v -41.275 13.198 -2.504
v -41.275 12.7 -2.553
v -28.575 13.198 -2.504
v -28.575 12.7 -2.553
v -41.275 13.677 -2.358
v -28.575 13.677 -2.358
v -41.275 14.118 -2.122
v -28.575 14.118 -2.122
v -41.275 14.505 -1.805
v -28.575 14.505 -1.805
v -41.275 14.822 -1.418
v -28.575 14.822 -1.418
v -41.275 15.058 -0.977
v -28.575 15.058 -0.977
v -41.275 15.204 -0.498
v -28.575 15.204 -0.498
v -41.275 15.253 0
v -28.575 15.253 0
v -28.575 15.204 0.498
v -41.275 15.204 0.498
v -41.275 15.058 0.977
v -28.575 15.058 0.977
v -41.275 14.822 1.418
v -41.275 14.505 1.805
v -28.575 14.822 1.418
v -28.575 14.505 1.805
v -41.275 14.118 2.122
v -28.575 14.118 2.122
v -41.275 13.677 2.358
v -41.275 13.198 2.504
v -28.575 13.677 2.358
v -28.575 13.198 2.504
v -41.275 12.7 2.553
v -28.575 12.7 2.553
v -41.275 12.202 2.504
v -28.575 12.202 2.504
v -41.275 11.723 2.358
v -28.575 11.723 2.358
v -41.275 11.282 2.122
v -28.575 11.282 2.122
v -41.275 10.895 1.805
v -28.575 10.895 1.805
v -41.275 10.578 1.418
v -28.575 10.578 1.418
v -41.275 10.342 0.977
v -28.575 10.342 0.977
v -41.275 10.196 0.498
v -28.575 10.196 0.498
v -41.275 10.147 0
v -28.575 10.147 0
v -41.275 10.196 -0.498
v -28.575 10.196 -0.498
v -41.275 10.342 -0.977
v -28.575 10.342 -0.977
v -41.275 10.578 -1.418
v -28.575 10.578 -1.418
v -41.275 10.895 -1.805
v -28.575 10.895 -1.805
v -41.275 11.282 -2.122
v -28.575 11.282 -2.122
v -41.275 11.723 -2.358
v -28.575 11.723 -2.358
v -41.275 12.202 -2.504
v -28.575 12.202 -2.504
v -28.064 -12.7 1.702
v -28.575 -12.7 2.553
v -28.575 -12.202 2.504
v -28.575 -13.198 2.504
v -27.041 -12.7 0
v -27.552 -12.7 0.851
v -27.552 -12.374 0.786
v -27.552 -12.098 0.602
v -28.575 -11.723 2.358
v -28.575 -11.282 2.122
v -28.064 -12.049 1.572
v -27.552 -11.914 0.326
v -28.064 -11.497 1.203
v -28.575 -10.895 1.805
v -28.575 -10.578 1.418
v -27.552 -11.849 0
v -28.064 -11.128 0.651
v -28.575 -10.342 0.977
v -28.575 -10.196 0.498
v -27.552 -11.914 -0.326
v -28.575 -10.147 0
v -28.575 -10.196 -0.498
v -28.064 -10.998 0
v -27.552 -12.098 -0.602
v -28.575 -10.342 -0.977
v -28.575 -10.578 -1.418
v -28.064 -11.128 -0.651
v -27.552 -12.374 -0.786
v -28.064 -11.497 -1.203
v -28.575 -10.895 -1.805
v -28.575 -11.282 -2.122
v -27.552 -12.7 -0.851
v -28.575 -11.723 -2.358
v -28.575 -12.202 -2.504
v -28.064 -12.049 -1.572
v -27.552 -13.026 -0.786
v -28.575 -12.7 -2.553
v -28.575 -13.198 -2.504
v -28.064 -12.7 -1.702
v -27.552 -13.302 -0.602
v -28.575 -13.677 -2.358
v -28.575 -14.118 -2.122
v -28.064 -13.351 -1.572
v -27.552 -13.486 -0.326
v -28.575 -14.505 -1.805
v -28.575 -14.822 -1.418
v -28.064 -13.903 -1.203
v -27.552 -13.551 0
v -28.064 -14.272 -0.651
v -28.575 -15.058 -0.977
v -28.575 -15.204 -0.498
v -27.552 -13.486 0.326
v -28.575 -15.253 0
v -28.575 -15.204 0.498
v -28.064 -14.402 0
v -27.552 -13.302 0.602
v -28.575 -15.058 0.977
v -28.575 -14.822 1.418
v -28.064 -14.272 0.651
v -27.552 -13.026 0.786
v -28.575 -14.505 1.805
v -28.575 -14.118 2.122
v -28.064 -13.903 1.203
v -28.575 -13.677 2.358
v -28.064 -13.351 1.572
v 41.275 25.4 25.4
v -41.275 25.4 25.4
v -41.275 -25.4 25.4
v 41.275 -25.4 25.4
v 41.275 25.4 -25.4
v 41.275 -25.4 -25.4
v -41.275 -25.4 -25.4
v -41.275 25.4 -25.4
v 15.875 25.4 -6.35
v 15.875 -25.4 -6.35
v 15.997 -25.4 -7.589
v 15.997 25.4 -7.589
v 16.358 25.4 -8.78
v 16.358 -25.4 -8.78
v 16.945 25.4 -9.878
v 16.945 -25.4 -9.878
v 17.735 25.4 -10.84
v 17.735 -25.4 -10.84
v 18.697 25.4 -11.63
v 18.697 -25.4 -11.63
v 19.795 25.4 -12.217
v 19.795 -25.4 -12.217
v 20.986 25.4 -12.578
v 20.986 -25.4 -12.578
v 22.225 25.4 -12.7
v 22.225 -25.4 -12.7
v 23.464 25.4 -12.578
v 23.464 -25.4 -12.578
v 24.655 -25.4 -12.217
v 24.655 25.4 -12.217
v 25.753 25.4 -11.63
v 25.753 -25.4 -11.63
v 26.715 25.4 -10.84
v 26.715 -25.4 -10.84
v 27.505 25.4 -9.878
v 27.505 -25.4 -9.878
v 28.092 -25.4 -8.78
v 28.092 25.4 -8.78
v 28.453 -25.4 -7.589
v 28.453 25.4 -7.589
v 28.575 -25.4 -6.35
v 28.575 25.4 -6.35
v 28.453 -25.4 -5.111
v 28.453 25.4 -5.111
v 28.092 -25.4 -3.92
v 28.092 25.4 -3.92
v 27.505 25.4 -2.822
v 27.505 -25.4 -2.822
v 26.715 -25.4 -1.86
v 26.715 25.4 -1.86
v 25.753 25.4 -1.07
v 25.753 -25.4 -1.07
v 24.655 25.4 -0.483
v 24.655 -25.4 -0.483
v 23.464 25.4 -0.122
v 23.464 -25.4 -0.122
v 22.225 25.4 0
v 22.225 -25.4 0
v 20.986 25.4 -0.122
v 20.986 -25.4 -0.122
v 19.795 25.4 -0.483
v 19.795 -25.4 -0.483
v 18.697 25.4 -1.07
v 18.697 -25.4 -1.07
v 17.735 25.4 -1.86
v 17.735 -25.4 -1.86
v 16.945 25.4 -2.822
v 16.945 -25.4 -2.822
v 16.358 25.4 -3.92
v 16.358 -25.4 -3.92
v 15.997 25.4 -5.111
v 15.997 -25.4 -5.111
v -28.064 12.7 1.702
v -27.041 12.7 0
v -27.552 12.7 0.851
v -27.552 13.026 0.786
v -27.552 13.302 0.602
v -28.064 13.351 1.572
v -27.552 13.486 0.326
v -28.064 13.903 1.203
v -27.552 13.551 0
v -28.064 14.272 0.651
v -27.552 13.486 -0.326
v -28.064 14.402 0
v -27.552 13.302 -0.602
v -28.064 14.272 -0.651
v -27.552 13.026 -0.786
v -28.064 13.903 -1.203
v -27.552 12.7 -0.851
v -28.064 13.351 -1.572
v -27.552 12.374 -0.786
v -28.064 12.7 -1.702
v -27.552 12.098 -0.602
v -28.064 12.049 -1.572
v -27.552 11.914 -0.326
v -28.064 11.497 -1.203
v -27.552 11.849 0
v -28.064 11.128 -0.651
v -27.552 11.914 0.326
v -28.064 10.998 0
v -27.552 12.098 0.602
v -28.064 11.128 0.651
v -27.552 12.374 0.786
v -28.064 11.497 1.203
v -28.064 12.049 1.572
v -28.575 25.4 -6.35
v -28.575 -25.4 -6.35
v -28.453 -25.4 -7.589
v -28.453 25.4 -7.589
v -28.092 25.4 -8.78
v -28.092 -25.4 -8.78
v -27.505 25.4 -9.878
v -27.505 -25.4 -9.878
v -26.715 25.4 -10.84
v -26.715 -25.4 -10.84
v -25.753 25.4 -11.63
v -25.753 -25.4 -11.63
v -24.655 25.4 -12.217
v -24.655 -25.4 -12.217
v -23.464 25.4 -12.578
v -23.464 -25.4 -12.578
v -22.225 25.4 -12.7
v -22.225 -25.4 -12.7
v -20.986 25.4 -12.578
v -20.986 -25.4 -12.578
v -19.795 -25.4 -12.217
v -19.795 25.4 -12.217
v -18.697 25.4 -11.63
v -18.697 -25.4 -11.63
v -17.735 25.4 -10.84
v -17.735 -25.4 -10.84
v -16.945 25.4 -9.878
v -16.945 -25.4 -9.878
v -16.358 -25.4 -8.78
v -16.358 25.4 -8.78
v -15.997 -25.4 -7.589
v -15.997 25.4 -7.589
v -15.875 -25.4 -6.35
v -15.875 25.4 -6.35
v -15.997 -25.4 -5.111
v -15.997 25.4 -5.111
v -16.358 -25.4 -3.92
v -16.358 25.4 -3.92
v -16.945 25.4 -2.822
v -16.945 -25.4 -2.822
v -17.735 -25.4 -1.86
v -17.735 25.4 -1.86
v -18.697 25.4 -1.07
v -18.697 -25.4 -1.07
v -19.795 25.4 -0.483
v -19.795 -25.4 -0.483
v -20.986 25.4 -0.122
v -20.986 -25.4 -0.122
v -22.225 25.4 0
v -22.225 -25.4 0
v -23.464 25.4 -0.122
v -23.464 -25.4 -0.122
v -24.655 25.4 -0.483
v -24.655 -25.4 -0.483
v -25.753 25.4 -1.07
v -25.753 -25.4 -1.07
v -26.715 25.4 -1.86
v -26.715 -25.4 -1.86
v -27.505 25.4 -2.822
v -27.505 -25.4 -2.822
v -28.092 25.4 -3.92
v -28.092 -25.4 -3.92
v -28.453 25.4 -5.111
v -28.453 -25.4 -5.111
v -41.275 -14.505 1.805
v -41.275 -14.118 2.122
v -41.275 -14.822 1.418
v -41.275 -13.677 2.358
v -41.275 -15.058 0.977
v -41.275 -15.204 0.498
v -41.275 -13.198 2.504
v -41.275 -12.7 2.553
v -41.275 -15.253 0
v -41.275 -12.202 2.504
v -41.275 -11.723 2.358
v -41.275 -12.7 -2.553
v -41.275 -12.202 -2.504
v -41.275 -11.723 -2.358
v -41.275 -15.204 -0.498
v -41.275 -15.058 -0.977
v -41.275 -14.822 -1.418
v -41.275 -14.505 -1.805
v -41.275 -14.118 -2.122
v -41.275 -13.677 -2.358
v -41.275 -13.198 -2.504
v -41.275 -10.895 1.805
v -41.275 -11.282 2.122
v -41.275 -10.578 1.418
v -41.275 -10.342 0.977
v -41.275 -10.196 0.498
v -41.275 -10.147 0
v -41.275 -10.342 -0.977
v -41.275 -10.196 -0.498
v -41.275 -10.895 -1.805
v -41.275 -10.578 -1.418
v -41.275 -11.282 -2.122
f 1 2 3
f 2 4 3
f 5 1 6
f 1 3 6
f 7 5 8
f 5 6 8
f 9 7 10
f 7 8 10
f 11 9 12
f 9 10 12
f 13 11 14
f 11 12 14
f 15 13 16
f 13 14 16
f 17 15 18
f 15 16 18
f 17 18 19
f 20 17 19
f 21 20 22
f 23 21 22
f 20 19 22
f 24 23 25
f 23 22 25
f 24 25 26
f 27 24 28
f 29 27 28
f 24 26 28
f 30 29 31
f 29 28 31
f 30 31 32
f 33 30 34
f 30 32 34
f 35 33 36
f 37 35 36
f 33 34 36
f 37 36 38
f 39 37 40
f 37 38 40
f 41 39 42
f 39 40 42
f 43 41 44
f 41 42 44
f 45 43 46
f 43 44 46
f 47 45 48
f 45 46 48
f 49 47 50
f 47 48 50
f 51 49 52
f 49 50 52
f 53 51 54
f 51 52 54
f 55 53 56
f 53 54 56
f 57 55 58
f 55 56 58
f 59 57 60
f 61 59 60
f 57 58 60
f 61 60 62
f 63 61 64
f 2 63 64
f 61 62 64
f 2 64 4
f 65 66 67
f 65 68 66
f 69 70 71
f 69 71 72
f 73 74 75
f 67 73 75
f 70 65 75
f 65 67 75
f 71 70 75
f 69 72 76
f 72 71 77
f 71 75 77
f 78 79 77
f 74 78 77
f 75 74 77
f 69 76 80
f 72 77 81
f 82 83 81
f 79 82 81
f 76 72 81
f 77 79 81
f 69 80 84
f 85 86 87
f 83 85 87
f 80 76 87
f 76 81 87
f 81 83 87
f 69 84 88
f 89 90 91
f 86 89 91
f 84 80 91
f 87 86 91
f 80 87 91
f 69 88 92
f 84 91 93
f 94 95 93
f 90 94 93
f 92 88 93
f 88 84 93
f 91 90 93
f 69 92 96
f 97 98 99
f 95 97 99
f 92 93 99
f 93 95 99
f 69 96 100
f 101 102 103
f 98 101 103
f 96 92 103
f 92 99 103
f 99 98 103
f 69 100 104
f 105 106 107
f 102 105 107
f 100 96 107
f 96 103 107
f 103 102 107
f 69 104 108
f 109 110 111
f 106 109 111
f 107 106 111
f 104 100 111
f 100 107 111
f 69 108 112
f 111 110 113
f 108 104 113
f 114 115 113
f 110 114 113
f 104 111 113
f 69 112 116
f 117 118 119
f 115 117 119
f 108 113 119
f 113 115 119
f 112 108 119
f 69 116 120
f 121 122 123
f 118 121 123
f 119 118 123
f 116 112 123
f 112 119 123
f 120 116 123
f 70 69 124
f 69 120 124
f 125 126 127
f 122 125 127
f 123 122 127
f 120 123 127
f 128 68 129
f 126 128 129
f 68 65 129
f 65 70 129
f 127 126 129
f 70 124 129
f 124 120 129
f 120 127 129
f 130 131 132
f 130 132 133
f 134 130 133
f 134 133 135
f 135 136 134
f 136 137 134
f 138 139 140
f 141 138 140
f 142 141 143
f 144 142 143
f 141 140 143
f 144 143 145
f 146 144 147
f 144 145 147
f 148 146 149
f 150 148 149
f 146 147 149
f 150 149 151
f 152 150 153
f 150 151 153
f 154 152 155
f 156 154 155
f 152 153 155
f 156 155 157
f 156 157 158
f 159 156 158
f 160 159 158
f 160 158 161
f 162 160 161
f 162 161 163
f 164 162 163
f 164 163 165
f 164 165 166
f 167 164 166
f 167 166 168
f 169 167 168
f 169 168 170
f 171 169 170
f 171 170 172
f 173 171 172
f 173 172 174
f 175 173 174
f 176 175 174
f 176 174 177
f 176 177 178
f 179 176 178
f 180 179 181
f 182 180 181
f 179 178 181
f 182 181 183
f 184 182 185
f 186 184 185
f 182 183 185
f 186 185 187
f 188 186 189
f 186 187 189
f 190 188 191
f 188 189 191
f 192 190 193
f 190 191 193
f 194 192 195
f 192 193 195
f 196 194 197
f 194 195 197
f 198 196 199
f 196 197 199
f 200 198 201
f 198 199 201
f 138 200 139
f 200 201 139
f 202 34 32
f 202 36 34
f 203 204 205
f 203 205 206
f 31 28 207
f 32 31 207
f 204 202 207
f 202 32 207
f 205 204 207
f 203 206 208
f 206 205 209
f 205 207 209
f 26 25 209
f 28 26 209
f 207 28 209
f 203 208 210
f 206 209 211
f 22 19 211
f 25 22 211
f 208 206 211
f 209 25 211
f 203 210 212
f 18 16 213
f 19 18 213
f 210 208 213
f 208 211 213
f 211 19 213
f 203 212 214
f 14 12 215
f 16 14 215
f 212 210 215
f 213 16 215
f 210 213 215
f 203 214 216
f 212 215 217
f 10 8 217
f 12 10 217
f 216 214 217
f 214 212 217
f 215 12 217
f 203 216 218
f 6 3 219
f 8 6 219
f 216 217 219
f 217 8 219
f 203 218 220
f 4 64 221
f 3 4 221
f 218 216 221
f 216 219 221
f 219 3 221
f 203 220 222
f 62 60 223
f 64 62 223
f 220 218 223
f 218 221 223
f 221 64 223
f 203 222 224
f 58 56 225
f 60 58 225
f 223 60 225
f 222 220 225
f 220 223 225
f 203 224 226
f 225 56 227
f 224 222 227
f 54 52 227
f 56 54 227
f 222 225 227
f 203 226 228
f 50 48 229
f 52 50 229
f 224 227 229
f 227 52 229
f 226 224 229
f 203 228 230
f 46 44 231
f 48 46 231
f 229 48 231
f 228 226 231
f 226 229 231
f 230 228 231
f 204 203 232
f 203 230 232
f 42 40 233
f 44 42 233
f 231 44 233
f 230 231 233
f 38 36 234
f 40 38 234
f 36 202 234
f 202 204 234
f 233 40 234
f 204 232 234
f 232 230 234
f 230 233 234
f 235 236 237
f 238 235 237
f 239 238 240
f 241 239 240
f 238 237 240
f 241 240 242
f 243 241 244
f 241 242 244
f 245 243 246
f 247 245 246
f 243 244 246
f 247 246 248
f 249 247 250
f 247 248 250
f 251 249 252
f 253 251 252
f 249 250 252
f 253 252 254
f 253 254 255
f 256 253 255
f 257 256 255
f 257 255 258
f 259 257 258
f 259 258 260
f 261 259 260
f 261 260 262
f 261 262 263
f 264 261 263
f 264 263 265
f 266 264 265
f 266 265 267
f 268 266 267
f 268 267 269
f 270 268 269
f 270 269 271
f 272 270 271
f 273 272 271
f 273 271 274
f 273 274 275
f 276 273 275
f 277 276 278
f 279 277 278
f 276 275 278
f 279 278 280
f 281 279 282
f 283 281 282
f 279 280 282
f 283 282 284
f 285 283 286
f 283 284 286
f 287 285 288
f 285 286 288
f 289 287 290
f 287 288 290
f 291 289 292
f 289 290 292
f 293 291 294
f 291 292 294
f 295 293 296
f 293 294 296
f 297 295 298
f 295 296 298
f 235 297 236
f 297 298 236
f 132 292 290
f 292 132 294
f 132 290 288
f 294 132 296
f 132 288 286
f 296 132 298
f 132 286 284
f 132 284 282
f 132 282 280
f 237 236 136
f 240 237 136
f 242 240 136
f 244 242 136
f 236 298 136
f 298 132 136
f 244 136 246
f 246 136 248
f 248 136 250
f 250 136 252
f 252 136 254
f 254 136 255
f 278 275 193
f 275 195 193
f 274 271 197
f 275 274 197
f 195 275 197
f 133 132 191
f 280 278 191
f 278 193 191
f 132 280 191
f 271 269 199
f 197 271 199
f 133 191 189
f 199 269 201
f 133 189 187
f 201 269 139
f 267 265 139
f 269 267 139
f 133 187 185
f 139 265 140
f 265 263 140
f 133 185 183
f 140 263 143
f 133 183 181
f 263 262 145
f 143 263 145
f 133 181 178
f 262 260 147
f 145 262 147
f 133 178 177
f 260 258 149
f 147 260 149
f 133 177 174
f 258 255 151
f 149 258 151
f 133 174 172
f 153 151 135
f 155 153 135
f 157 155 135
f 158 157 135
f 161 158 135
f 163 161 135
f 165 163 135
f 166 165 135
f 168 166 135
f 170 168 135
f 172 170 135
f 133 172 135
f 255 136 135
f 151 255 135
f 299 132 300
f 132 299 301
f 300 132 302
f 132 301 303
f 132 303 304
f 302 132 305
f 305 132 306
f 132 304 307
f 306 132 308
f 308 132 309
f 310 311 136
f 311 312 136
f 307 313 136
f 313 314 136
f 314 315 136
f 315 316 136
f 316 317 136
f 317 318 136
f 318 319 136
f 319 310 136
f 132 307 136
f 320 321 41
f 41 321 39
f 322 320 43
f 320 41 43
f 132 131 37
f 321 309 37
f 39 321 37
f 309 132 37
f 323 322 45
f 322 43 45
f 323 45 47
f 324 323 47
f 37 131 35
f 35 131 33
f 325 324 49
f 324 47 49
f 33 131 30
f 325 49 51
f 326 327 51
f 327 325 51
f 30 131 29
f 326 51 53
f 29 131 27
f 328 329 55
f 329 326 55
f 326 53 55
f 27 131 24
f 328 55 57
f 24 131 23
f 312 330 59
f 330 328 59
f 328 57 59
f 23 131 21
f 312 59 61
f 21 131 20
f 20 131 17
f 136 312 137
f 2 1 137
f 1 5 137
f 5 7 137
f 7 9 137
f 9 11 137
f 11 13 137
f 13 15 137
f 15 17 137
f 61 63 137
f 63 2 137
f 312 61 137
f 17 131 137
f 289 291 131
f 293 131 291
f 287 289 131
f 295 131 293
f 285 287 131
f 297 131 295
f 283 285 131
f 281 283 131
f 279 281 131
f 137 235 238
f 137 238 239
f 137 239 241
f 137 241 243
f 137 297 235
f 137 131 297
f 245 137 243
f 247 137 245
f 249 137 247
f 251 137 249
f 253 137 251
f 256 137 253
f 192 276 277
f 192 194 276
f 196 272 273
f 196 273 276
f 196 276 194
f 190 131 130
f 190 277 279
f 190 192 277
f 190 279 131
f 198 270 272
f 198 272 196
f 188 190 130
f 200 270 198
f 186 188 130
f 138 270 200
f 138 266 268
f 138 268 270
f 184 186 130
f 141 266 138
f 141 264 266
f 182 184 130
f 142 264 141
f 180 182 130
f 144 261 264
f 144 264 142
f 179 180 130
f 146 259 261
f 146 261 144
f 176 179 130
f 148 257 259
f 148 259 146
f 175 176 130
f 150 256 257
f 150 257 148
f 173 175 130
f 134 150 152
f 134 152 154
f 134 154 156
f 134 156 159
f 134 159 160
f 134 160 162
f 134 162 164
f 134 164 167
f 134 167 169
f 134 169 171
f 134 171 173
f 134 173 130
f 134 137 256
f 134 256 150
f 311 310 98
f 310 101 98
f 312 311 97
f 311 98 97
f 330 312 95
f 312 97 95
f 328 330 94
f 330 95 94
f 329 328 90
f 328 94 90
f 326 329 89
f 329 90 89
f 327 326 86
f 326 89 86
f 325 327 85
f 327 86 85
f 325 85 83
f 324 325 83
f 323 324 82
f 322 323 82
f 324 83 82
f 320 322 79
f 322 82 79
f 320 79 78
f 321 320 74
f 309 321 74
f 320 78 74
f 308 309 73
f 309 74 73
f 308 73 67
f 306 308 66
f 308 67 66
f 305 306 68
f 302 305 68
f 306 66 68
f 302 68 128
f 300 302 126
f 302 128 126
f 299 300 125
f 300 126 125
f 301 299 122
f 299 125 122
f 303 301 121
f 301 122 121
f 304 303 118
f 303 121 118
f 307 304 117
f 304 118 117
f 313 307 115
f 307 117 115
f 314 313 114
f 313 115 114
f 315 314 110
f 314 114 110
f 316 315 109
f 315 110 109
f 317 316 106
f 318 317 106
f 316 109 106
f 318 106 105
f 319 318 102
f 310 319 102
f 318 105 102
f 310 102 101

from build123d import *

# Parameters (mm, degrees)
SKETCH1_W                   = 82.55
SKETCH1_H                   = 50.8
BOSS_EXTRUDE1_DEPTH         = 25.4
F_1_2_0_5000_DOWEL_HOLE1_D  = 12.7
F_1_4_20_TAPPED_HOLE1_D     = 5.1054
F_1_4_20_TAPPED_HOLE1_DEPTH = 12.7
F_1_4_20_TAPPED_HOLE1_TIP   = 1.533816902


with BuildPart() as part:
    # Sketch1 → Boss-Extrude1 (new, symmetric)
    with BuildSketch(Plane(origin=(0, 0, 0), x_dir=(1, 0, 0), z_dir=(0, 1, 0))):
        Rectangle(SKETCH1_W, SKETCH1_H)
    extrude(amount=BOSS_EXTRUDE1_DEPTH, both=True)

    # 1/2 (0.5000) Dowel Hole1 (through all)
    with Locations(Plane(origin=(0, 25.4, 0), x_dir=(1, 0, 0), z_dir=(0, 1, 0))):
        with Locations((22.225, 6.35), (-22.225, 6.35)):
            Hole(F_1_2_0_5000_DOWEL_HOLE1_D / 2)

    # 1/4-20 Tapped Hole1
    with Locations(Plane.ZY.offset(41.275)):
        with Locations((0, 12.7), (0, -12.7)):
            Hole(F_1_4_20_TAPPED_HOLE1_D / 2, depth=F_1_4_20_TAPPED_HOLE1_DEPTH)
            with Locations((0, 0, -(F_1_4_20_TAPPED_HOLE1_DEPTH + F_1_4_20_TAPPED_HOLE1_TIP / 2))):  # 118° drill point
                Cone(0, F_1_4_20_TAPPED_HOLE1_D / 2, F_1_4_20_TAPPED_HOLE1_TIP, mode=Mode.SUBTRACT)


solid = part.part
